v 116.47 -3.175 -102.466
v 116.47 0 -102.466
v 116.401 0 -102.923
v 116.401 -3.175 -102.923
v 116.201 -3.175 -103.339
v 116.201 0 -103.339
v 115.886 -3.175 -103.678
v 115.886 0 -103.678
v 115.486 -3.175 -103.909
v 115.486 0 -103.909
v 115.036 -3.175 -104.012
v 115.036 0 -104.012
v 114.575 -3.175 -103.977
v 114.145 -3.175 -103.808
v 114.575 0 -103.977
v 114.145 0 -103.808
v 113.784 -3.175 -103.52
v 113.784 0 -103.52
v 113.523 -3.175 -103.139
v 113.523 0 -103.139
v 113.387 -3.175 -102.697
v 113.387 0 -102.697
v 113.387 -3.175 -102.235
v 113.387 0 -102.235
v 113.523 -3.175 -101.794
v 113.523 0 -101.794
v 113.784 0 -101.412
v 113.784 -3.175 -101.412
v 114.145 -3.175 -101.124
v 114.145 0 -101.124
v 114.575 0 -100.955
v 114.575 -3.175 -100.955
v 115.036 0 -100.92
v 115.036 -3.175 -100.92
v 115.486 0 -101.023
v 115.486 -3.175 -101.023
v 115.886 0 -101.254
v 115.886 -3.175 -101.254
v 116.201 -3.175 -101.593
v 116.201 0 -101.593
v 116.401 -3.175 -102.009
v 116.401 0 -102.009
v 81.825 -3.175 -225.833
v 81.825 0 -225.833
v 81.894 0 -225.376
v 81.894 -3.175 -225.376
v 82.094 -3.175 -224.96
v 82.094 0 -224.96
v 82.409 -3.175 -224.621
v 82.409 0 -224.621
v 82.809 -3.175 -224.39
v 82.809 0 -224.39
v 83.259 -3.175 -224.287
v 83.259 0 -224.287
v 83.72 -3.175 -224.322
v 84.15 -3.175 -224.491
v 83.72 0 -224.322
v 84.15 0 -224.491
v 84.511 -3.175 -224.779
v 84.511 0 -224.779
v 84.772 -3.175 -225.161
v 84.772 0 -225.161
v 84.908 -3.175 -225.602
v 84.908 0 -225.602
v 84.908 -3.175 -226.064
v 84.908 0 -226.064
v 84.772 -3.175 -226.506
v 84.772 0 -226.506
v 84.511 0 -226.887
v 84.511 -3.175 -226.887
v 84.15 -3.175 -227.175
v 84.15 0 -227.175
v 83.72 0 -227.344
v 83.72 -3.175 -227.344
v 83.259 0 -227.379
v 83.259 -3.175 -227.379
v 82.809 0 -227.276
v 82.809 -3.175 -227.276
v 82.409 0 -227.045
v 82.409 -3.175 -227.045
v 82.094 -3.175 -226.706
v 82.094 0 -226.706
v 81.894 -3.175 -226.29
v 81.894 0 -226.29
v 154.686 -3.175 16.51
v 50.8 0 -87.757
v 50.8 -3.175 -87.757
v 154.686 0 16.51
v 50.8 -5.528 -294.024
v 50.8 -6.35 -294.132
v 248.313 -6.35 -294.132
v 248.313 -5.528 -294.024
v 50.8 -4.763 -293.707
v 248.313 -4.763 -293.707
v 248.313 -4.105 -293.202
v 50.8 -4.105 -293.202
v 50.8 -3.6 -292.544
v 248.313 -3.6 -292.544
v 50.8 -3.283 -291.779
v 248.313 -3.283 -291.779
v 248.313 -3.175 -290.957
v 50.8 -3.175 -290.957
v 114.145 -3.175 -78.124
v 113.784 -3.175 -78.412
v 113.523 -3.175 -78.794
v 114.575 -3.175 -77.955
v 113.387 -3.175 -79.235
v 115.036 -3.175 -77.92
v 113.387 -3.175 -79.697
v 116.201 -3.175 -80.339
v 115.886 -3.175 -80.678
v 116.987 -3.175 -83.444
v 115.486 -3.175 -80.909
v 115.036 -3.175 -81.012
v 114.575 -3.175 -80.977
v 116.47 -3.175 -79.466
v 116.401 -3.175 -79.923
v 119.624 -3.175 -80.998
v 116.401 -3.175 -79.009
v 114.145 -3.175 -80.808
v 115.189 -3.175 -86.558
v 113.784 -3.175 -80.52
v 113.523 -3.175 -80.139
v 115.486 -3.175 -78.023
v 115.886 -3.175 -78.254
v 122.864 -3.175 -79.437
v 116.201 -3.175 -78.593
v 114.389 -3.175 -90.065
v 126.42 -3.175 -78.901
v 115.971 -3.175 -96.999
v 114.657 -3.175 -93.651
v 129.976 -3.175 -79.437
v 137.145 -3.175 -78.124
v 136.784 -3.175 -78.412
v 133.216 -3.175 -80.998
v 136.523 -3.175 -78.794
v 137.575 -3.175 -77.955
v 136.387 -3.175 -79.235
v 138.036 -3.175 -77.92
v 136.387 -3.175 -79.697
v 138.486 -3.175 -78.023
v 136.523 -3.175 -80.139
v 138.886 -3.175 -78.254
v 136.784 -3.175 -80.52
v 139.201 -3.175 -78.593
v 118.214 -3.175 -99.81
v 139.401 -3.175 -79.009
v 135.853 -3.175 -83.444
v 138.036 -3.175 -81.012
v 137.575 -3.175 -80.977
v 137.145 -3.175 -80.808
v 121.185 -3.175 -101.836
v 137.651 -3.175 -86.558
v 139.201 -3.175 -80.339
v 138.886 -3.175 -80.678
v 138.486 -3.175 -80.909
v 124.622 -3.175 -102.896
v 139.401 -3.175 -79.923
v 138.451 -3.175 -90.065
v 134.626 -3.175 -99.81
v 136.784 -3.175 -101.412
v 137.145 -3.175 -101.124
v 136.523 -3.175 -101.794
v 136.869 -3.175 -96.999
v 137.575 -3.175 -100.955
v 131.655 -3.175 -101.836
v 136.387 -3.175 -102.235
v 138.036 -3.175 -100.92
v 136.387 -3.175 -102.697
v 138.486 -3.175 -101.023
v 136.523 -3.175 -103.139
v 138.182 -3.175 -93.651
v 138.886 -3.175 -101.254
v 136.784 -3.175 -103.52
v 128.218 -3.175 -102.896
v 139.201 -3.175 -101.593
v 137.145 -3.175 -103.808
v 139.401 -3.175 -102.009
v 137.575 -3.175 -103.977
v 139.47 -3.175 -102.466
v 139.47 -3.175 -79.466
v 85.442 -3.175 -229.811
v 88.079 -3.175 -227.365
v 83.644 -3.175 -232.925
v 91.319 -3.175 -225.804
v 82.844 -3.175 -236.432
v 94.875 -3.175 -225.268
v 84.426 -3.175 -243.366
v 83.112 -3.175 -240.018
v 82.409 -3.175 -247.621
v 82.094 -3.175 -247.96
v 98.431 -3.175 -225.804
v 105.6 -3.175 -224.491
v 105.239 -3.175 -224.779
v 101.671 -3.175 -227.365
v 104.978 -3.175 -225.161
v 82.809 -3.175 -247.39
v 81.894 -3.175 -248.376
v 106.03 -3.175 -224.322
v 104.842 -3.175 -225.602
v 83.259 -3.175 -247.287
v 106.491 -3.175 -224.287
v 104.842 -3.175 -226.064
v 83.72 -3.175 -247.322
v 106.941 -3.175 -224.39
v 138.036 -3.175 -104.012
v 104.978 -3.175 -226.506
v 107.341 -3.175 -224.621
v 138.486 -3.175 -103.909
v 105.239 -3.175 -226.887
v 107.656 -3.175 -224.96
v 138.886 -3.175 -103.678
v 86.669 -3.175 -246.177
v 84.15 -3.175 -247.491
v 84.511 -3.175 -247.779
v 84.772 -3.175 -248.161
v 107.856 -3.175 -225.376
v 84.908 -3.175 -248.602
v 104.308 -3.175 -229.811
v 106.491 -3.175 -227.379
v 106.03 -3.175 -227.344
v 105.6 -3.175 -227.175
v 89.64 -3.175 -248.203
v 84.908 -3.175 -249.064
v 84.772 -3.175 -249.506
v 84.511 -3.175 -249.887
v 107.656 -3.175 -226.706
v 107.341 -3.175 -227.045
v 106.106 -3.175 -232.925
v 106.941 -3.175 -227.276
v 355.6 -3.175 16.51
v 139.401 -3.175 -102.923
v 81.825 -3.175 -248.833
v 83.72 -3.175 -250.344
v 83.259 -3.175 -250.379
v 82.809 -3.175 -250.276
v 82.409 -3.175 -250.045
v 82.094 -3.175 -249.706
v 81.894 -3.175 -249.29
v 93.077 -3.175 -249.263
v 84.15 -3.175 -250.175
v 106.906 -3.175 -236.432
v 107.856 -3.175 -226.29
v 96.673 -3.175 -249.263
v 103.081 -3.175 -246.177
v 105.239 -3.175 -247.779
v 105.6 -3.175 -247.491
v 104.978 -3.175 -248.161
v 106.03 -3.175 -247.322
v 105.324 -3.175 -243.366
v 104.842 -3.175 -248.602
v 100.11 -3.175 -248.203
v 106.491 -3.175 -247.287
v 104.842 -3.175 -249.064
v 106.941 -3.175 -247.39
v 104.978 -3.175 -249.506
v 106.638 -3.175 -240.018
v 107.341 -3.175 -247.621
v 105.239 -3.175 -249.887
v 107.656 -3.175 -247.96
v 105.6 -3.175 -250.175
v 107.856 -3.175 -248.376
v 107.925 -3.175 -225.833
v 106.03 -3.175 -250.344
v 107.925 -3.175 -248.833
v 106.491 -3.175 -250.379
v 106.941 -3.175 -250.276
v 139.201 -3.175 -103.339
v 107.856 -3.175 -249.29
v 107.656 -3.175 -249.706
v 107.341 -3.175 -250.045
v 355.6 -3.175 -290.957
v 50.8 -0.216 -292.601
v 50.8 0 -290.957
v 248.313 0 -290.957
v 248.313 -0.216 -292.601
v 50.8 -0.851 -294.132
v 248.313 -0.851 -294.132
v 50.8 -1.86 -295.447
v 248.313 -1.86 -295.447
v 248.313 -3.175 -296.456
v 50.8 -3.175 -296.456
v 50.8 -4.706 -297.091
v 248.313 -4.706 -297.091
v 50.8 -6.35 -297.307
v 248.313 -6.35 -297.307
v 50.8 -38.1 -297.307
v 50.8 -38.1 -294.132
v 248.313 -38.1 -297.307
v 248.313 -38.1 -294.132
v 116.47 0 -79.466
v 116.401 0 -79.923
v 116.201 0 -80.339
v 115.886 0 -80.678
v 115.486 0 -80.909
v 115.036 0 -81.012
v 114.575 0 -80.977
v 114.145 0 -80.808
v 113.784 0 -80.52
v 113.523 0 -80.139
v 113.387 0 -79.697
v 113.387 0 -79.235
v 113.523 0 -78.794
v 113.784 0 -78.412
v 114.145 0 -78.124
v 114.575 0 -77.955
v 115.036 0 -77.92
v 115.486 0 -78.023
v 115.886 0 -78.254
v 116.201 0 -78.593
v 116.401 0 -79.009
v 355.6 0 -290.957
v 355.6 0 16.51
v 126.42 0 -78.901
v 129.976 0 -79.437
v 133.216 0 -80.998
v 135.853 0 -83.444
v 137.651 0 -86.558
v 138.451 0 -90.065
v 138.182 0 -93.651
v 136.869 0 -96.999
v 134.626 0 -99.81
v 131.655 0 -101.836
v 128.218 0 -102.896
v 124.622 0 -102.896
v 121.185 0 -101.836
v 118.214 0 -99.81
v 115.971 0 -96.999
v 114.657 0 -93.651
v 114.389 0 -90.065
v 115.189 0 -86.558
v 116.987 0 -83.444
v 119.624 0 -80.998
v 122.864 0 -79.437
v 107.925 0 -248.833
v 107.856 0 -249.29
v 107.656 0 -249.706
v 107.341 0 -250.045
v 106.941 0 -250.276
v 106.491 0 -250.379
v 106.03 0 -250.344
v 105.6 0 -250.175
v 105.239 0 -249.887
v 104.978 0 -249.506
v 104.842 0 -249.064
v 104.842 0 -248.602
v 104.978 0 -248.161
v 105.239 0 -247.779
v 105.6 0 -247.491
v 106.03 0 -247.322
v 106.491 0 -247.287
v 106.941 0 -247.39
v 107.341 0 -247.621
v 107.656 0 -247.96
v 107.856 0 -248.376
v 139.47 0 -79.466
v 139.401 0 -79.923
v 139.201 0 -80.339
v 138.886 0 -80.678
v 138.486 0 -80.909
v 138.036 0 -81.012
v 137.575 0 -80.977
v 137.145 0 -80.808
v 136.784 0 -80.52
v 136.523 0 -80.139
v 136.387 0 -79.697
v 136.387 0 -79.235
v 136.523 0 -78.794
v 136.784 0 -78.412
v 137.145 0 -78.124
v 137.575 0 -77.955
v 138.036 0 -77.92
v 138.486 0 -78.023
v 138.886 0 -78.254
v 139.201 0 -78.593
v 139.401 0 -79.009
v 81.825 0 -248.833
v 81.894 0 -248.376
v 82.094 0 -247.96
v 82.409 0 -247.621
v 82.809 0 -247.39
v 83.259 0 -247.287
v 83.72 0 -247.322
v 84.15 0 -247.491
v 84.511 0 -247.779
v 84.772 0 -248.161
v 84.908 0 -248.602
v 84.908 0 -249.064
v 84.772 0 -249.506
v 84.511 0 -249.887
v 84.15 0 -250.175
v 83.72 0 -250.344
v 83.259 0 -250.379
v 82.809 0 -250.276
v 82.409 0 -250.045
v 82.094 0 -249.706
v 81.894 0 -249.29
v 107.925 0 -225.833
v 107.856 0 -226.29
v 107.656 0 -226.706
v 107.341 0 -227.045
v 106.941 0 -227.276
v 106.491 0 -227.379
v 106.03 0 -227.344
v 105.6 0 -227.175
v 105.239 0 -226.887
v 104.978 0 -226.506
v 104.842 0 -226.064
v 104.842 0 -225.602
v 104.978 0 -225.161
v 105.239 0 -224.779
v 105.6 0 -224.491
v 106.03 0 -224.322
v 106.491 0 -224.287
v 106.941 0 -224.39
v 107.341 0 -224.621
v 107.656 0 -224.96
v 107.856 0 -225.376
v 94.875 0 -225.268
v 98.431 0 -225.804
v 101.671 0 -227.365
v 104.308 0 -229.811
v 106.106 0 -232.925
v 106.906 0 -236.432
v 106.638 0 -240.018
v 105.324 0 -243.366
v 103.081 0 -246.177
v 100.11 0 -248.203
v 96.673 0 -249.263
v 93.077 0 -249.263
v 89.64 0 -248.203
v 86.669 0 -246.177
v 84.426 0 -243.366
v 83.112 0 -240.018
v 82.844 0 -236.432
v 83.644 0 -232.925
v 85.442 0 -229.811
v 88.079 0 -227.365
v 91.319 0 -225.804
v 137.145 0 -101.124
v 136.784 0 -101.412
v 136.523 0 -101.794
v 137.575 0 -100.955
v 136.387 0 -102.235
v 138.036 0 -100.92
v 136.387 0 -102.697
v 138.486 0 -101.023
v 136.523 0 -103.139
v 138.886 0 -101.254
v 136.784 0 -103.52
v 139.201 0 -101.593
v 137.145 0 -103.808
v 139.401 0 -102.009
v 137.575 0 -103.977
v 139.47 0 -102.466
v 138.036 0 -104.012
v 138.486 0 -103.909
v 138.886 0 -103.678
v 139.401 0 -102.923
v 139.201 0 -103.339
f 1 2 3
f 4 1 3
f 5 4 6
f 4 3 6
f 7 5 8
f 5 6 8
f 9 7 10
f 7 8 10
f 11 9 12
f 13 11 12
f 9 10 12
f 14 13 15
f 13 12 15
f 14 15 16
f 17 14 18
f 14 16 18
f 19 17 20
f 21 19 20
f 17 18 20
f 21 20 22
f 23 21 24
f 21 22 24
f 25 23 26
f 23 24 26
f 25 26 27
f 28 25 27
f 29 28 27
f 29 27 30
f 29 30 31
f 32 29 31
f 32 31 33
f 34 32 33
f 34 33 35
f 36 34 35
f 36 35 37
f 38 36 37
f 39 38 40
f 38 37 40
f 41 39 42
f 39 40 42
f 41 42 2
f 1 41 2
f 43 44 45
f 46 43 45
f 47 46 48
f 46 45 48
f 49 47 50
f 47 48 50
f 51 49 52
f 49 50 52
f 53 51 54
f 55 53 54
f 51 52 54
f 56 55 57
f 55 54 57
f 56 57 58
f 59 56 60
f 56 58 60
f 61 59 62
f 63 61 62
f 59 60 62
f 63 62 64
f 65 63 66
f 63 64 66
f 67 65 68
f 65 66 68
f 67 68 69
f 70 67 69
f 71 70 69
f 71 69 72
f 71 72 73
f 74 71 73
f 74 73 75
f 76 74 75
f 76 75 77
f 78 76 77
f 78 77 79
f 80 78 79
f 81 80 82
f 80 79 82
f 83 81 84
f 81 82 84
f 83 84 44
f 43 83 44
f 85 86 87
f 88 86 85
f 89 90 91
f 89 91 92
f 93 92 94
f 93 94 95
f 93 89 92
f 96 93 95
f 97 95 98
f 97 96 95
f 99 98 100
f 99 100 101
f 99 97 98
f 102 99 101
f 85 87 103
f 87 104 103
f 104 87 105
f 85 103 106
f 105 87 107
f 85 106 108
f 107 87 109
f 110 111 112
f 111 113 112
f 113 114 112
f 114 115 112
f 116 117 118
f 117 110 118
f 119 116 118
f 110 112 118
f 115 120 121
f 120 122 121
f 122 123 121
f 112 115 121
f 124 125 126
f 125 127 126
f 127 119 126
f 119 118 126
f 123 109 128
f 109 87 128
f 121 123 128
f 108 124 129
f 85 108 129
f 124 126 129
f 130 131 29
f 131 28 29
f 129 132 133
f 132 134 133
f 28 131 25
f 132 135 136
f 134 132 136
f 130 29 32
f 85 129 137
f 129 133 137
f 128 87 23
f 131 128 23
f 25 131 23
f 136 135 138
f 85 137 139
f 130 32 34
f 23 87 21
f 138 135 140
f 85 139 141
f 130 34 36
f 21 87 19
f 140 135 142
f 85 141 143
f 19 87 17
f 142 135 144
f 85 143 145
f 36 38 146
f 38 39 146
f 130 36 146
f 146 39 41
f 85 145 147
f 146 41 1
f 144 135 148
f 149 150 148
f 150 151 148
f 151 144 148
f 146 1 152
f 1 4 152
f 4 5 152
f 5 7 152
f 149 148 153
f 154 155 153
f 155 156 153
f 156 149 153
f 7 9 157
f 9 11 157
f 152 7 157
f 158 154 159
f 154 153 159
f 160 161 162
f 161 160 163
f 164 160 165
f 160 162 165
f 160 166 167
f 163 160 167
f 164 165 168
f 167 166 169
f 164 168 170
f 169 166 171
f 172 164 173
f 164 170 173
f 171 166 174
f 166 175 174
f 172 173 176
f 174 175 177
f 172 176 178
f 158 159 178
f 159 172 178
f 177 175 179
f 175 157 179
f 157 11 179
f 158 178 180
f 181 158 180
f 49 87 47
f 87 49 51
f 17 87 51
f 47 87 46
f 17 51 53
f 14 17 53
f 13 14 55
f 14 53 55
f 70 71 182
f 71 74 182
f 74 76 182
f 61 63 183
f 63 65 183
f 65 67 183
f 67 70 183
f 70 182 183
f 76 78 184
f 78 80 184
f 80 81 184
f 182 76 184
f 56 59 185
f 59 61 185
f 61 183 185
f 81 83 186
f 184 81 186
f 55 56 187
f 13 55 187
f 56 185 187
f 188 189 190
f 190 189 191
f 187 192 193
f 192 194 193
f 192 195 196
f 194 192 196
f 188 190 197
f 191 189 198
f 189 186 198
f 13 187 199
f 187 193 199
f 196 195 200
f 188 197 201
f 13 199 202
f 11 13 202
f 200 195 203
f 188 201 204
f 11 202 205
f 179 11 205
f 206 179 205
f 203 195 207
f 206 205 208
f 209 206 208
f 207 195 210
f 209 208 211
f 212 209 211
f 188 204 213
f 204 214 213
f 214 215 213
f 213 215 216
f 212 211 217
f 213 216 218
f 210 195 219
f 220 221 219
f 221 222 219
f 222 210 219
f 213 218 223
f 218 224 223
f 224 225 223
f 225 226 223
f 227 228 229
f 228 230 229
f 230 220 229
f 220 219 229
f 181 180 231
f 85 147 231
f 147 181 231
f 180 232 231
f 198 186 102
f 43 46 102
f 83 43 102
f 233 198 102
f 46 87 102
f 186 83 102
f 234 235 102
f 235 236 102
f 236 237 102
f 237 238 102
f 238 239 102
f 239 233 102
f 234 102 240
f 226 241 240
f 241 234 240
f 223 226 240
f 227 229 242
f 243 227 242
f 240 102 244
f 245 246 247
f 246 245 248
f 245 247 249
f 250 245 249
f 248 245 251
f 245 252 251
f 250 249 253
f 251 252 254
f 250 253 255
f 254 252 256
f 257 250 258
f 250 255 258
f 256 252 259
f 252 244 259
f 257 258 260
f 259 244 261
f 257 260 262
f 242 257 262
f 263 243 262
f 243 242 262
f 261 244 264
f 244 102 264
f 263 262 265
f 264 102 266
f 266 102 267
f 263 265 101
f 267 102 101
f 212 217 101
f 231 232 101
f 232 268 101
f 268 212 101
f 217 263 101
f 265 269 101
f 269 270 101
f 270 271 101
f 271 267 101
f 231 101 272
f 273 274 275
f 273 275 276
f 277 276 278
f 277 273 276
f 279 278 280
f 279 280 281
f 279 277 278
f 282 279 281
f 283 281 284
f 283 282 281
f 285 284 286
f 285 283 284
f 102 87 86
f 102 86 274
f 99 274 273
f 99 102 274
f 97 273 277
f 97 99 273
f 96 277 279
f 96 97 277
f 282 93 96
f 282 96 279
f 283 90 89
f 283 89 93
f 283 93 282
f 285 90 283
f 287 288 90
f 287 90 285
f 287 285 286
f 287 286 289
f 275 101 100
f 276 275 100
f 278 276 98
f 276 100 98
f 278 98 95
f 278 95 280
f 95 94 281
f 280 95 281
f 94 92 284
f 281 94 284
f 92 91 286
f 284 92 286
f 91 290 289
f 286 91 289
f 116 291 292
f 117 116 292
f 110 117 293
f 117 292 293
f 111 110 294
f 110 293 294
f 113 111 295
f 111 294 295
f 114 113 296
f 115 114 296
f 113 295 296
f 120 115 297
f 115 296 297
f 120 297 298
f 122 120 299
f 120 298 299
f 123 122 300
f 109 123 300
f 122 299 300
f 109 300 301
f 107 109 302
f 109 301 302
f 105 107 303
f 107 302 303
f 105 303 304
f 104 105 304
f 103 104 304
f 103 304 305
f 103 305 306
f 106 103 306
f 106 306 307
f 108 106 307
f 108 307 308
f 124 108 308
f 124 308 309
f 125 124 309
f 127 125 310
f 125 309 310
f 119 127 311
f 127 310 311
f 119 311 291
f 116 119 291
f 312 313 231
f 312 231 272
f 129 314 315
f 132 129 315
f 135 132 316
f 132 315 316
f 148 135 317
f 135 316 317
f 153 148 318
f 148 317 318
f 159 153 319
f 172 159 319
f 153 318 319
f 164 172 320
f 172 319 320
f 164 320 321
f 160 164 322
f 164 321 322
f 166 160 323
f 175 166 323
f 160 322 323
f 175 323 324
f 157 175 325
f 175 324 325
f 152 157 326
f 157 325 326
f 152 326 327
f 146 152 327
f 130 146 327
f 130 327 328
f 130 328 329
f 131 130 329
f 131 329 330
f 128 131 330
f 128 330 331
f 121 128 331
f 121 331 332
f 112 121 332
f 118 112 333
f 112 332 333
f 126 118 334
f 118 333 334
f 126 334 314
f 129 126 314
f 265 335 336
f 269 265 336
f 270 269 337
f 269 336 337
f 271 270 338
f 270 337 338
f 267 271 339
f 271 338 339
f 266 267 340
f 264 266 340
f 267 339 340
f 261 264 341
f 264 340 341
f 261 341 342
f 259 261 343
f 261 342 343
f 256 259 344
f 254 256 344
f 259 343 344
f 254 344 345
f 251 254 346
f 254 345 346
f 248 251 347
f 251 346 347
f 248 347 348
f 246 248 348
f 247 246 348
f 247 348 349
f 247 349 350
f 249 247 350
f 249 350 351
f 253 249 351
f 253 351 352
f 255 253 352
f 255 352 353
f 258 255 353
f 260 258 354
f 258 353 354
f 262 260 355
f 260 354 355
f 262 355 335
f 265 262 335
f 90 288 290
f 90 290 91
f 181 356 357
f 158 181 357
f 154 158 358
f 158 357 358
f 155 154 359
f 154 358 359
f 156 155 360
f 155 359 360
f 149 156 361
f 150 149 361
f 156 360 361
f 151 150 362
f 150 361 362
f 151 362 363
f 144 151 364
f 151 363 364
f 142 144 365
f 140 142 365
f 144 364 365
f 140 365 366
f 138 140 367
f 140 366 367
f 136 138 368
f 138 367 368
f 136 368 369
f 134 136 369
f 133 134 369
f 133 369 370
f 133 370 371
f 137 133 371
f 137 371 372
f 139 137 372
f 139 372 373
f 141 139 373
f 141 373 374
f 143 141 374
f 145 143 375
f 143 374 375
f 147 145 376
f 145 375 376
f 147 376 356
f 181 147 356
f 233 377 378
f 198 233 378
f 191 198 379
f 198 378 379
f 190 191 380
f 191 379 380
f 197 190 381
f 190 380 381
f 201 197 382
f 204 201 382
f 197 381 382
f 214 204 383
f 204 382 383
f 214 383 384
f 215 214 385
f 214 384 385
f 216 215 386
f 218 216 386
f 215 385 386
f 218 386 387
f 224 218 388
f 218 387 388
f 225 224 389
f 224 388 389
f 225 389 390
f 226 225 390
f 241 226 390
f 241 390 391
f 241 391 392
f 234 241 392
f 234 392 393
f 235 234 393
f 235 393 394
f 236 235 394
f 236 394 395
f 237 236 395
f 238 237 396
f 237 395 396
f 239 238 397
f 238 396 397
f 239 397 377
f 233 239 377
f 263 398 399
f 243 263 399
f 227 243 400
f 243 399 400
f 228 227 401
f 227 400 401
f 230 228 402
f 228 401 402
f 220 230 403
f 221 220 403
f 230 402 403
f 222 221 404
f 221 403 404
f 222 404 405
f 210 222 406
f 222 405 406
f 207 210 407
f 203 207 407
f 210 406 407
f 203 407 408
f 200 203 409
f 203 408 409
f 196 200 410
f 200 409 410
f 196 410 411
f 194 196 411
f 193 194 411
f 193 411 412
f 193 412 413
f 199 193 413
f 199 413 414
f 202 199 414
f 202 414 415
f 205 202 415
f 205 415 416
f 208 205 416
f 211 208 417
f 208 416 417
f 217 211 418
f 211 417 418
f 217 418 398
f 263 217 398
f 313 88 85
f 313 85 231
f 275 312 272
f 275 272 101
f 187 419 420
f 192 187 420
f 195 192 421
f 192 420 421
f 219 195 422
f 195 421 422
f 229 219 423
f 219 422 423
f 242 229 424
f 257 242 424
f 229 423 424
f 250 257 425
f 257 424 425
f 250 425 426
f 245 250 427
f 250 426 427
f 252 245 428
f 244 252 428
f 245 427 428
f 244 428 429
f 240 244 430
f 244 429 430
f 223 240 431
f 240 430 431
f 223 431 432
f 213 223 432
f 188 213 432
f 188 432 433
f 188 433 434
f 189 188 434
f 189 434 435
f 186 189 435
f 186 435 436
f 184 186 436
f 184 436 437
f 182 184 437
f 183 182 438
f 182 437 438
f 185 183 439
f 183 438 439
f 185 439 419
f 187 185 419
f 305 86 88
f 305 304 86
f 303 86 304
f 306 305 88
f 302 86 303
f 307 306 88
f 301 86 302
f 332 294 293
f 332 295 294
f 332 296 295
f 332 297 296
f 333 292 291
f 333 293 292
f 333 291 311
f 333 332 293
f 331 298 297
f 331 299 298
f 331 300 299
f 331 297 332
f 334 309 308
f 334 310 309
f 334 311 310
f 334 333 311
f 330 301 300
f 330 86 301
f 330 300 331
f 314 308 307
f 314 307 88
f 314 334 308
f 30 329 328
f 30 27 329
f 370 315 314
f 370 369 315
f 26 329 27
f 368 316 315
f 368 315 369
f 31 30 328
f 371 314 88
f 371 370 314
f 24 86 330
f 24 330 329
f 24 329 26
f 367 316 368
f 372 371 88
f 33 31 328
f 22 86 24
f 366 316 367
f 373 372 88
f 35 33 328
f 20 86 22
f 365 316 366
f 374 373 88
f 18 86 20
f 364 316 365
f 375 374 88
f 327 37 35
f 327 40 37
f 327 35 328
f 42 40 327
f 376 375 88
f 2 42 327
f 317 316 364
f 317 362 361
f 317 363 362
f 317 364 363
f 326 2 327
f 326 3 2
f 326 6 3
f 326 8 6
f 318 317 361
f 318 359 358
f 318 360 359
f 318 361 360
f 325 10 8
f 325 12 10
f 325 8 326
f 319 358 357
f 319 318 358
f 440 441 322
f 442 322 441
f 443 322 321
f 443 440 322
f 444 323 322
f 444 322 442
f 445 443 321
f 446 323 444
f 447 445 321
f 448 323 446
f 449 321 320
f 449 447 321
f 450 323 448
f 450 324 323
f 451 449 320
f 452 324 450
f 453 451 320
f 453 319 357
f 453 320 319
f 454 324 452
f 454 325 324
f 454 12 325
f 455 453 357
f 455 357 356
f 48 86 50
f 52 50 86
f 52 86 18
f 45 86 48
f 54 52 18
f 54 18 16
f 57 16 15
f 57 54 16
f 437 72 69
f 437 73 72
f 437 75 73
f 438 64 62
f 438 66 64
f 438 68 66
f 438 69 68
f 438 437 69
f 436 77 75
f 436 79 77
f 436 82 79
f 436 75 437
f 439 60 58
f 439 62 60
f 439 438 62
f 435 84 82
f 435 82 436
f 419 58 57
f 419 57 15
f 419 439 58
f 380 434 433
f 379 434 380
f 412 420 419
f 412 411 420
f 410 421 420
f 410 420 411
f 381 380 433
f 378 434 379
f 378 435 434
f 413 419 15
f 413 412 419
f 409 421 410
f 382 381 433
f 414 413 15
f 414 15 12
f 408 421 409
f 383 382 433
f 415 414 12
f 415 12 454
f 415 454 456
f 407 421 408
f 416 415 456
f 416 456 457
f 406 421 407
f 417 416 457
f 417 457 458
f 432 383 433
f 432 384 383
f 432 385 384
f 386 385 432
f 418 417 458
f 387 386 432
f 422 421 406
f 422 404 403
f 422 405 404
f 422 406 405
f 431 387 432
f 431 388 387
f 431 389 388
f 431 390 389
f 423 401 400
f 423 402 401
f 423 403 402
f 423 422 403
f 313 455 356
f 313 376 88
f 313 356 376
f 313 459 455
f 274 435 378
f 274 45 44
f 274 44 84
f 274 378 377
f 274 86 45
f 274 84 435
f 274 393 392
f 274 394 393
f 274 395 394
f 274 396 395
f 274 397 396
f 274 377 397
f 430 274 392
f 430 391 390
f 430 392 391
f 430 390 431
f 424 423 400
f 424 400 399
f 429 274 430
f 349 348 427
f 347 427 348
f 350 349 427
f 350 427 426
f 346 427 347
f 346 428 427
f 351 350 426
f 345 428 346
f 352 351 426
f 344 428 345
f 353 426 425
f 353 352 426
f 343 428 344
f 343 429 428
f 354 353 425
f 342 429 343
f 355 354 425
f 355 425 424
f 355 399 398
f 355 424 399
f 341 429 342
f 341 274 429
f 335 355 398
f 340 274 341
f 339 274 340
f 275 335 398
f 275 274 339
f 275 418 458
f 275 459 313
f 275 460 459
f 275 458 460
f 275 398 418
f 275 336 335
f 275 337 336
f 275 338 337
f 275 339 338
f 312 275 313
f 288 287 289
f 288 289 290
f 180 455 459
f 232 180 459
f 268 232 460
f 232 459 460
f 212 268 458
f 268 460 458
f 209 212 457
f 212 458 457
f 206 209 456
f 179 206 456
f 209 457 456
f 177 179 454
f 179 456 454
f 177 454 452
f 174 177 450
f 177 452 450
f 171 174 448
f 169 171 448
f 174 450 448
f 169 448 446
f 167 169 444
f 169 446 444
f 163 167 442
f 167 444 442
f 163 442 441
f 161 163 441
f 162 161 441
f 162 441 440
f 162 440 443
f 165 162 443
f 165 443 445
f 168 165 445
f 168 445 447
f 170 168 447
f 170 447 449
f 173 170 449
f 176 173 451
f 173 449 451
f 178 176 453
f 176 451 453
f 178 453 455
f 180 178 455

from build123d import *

# Parameters (mm, degrees)
BASE_FLANGE1_DEPTH = 3.175
EDGE_FLANGE1_DEPTH = 197.512880056
SKETCH9_R          = 12.065
CUT_EXTRUDE1_DEPTH = 3.175


# Sheet-metal steps are written as plain solids
with BuildPart() as part:
    # Sketch1 → Base-Flange1 (new body)
    with BuildSketch(Plane(origin=(0, 0, 0), x_dir=(1, 0, 0), z_dir=(0, 1, 0))):
        Polygon((154.686, -16.51), (355.6, -16.51), (355.6, 290.957), (50.8, 290.957), (50.8, 87.757), align=None)
    extrude(amount=-BASE_FLANGE1_DEPTH)

    # Edge-Flange1 section (across the edge) → Edge-Flange1 (add)
    with BuildSketch(Plane(origin=(50.8, -3.175, -294.132), x_dir=(0, 0, 1), z_dir=(1, 0, 0))):
        with BuildLine():
            Line((-3.175, 3.175), (-3.175, 34.925))
            Line((-3.175, 34.925), (0, 34.925))
            Line((0, 34.925), (0, 3.175))
            ThreePointArc((0, 3.175), (0.92993597, 0.92993597), (3.175, 0))
            Line((3.175, 0), (3.175, -3.175))
            ThreePointArc((3.175, -3.175), (-1.315128061, -1.315128061), (-3.175, 3.175))
        make_face()
    extrude(amount=EDGE_FLANGE1_DEPTH)

    # Sketch9 → Cut-Extrude1 (cut)
    with BuildSketch(Plane(origin=(0, 0, 0), x_dir=(1, 0, 0), z_dir=(0, 1, 0))):
        with BuildLine():
            ThreePointArc((84.925, 225.833155379), (83.375, 227.383155379), (81.825, 225.833155379))
            ThreePointArc((81.825, 225.833155379), (83.375, 224.283155379), (84.925, 225.833155379))
        make_face()
        with BuildLine():
            ThreePointArc((104.825, 225.833155379), (106.375, 224.283155379), (107.925, 225.833155379))
            ThreePointArc((107.925, 225.833155379), (106.375, 227.383155379), (104.825, 225.833155379))
        make_face()
        with BuildLine():
            ThreePointArc((104.825, 248.833155379), (106.375, 247.283155379), (107.925, 248.833155379))
            ThreePointArc((107.925, 248.833155379), (106.375, 250.383155379), (104.825, 248.833155379))
        make_face()
        with BuildLine():
            ThreePointArc((84.925, 248.833155379), (83.375, 250.383155379), (81.825, 248.833155379))
            ThreePointArc((81.825, 248.833155379), (83.375, 247.283155379), (84.925, 248.833155379))
        make_face()
        with Locations(Location((94.875, 237.333155379, 0), (0, 0, 270))):
            Circle(SKETCH9_R)
        with BuildLine():
            ThreePointArc((136.36996, 79.466155379), (137.91996, 77.916155379), (139.46996, 79.466155379))
            ThreePointArc((139.46996, 79.466155379), (137.91996, 81.016155379), (136.36996, 79.466155379))
        make_face()
        with BuildLine():
            ThreePointArc((136.36996, 102.466155379), (137.91996, 100.916155379), (139.46996, 102.466155379))
            ThreePointArc((139.46996, 102.466155379), (137.91996, 104.016155379), (136.36996, 102.466155379))
        make_face()
        with Locations(Location((126.41996, 90.966155379, 0), (0, 0, 270))):
            Circle(SKETCH9_R)
        with BuildLine():
            ThreePointArc((113.36996, 102.466155379), (114.91996, 100.916155379), (116.46996, 102.466155379))
            ThreePointArc((116.46996, 102.466155379), (114.91996, 104.016155379), (113.36996, 102.466155379))
        make_face()
        with BuildLine():
            ThreePointArc((113.36996, 79.466155379), (114.91996, 77.916155379), (116.46996, 79.466155379))
            ThreePointArc((116.46996, 79.466155379), (114.91996, 81.016155379), (113.36996, 79.466155379))
        make_face()
    extrude(amount=-CUT_EXTRUDE1_DEPTH, mode=Mode.SUBTRACT)


solid = part.part
